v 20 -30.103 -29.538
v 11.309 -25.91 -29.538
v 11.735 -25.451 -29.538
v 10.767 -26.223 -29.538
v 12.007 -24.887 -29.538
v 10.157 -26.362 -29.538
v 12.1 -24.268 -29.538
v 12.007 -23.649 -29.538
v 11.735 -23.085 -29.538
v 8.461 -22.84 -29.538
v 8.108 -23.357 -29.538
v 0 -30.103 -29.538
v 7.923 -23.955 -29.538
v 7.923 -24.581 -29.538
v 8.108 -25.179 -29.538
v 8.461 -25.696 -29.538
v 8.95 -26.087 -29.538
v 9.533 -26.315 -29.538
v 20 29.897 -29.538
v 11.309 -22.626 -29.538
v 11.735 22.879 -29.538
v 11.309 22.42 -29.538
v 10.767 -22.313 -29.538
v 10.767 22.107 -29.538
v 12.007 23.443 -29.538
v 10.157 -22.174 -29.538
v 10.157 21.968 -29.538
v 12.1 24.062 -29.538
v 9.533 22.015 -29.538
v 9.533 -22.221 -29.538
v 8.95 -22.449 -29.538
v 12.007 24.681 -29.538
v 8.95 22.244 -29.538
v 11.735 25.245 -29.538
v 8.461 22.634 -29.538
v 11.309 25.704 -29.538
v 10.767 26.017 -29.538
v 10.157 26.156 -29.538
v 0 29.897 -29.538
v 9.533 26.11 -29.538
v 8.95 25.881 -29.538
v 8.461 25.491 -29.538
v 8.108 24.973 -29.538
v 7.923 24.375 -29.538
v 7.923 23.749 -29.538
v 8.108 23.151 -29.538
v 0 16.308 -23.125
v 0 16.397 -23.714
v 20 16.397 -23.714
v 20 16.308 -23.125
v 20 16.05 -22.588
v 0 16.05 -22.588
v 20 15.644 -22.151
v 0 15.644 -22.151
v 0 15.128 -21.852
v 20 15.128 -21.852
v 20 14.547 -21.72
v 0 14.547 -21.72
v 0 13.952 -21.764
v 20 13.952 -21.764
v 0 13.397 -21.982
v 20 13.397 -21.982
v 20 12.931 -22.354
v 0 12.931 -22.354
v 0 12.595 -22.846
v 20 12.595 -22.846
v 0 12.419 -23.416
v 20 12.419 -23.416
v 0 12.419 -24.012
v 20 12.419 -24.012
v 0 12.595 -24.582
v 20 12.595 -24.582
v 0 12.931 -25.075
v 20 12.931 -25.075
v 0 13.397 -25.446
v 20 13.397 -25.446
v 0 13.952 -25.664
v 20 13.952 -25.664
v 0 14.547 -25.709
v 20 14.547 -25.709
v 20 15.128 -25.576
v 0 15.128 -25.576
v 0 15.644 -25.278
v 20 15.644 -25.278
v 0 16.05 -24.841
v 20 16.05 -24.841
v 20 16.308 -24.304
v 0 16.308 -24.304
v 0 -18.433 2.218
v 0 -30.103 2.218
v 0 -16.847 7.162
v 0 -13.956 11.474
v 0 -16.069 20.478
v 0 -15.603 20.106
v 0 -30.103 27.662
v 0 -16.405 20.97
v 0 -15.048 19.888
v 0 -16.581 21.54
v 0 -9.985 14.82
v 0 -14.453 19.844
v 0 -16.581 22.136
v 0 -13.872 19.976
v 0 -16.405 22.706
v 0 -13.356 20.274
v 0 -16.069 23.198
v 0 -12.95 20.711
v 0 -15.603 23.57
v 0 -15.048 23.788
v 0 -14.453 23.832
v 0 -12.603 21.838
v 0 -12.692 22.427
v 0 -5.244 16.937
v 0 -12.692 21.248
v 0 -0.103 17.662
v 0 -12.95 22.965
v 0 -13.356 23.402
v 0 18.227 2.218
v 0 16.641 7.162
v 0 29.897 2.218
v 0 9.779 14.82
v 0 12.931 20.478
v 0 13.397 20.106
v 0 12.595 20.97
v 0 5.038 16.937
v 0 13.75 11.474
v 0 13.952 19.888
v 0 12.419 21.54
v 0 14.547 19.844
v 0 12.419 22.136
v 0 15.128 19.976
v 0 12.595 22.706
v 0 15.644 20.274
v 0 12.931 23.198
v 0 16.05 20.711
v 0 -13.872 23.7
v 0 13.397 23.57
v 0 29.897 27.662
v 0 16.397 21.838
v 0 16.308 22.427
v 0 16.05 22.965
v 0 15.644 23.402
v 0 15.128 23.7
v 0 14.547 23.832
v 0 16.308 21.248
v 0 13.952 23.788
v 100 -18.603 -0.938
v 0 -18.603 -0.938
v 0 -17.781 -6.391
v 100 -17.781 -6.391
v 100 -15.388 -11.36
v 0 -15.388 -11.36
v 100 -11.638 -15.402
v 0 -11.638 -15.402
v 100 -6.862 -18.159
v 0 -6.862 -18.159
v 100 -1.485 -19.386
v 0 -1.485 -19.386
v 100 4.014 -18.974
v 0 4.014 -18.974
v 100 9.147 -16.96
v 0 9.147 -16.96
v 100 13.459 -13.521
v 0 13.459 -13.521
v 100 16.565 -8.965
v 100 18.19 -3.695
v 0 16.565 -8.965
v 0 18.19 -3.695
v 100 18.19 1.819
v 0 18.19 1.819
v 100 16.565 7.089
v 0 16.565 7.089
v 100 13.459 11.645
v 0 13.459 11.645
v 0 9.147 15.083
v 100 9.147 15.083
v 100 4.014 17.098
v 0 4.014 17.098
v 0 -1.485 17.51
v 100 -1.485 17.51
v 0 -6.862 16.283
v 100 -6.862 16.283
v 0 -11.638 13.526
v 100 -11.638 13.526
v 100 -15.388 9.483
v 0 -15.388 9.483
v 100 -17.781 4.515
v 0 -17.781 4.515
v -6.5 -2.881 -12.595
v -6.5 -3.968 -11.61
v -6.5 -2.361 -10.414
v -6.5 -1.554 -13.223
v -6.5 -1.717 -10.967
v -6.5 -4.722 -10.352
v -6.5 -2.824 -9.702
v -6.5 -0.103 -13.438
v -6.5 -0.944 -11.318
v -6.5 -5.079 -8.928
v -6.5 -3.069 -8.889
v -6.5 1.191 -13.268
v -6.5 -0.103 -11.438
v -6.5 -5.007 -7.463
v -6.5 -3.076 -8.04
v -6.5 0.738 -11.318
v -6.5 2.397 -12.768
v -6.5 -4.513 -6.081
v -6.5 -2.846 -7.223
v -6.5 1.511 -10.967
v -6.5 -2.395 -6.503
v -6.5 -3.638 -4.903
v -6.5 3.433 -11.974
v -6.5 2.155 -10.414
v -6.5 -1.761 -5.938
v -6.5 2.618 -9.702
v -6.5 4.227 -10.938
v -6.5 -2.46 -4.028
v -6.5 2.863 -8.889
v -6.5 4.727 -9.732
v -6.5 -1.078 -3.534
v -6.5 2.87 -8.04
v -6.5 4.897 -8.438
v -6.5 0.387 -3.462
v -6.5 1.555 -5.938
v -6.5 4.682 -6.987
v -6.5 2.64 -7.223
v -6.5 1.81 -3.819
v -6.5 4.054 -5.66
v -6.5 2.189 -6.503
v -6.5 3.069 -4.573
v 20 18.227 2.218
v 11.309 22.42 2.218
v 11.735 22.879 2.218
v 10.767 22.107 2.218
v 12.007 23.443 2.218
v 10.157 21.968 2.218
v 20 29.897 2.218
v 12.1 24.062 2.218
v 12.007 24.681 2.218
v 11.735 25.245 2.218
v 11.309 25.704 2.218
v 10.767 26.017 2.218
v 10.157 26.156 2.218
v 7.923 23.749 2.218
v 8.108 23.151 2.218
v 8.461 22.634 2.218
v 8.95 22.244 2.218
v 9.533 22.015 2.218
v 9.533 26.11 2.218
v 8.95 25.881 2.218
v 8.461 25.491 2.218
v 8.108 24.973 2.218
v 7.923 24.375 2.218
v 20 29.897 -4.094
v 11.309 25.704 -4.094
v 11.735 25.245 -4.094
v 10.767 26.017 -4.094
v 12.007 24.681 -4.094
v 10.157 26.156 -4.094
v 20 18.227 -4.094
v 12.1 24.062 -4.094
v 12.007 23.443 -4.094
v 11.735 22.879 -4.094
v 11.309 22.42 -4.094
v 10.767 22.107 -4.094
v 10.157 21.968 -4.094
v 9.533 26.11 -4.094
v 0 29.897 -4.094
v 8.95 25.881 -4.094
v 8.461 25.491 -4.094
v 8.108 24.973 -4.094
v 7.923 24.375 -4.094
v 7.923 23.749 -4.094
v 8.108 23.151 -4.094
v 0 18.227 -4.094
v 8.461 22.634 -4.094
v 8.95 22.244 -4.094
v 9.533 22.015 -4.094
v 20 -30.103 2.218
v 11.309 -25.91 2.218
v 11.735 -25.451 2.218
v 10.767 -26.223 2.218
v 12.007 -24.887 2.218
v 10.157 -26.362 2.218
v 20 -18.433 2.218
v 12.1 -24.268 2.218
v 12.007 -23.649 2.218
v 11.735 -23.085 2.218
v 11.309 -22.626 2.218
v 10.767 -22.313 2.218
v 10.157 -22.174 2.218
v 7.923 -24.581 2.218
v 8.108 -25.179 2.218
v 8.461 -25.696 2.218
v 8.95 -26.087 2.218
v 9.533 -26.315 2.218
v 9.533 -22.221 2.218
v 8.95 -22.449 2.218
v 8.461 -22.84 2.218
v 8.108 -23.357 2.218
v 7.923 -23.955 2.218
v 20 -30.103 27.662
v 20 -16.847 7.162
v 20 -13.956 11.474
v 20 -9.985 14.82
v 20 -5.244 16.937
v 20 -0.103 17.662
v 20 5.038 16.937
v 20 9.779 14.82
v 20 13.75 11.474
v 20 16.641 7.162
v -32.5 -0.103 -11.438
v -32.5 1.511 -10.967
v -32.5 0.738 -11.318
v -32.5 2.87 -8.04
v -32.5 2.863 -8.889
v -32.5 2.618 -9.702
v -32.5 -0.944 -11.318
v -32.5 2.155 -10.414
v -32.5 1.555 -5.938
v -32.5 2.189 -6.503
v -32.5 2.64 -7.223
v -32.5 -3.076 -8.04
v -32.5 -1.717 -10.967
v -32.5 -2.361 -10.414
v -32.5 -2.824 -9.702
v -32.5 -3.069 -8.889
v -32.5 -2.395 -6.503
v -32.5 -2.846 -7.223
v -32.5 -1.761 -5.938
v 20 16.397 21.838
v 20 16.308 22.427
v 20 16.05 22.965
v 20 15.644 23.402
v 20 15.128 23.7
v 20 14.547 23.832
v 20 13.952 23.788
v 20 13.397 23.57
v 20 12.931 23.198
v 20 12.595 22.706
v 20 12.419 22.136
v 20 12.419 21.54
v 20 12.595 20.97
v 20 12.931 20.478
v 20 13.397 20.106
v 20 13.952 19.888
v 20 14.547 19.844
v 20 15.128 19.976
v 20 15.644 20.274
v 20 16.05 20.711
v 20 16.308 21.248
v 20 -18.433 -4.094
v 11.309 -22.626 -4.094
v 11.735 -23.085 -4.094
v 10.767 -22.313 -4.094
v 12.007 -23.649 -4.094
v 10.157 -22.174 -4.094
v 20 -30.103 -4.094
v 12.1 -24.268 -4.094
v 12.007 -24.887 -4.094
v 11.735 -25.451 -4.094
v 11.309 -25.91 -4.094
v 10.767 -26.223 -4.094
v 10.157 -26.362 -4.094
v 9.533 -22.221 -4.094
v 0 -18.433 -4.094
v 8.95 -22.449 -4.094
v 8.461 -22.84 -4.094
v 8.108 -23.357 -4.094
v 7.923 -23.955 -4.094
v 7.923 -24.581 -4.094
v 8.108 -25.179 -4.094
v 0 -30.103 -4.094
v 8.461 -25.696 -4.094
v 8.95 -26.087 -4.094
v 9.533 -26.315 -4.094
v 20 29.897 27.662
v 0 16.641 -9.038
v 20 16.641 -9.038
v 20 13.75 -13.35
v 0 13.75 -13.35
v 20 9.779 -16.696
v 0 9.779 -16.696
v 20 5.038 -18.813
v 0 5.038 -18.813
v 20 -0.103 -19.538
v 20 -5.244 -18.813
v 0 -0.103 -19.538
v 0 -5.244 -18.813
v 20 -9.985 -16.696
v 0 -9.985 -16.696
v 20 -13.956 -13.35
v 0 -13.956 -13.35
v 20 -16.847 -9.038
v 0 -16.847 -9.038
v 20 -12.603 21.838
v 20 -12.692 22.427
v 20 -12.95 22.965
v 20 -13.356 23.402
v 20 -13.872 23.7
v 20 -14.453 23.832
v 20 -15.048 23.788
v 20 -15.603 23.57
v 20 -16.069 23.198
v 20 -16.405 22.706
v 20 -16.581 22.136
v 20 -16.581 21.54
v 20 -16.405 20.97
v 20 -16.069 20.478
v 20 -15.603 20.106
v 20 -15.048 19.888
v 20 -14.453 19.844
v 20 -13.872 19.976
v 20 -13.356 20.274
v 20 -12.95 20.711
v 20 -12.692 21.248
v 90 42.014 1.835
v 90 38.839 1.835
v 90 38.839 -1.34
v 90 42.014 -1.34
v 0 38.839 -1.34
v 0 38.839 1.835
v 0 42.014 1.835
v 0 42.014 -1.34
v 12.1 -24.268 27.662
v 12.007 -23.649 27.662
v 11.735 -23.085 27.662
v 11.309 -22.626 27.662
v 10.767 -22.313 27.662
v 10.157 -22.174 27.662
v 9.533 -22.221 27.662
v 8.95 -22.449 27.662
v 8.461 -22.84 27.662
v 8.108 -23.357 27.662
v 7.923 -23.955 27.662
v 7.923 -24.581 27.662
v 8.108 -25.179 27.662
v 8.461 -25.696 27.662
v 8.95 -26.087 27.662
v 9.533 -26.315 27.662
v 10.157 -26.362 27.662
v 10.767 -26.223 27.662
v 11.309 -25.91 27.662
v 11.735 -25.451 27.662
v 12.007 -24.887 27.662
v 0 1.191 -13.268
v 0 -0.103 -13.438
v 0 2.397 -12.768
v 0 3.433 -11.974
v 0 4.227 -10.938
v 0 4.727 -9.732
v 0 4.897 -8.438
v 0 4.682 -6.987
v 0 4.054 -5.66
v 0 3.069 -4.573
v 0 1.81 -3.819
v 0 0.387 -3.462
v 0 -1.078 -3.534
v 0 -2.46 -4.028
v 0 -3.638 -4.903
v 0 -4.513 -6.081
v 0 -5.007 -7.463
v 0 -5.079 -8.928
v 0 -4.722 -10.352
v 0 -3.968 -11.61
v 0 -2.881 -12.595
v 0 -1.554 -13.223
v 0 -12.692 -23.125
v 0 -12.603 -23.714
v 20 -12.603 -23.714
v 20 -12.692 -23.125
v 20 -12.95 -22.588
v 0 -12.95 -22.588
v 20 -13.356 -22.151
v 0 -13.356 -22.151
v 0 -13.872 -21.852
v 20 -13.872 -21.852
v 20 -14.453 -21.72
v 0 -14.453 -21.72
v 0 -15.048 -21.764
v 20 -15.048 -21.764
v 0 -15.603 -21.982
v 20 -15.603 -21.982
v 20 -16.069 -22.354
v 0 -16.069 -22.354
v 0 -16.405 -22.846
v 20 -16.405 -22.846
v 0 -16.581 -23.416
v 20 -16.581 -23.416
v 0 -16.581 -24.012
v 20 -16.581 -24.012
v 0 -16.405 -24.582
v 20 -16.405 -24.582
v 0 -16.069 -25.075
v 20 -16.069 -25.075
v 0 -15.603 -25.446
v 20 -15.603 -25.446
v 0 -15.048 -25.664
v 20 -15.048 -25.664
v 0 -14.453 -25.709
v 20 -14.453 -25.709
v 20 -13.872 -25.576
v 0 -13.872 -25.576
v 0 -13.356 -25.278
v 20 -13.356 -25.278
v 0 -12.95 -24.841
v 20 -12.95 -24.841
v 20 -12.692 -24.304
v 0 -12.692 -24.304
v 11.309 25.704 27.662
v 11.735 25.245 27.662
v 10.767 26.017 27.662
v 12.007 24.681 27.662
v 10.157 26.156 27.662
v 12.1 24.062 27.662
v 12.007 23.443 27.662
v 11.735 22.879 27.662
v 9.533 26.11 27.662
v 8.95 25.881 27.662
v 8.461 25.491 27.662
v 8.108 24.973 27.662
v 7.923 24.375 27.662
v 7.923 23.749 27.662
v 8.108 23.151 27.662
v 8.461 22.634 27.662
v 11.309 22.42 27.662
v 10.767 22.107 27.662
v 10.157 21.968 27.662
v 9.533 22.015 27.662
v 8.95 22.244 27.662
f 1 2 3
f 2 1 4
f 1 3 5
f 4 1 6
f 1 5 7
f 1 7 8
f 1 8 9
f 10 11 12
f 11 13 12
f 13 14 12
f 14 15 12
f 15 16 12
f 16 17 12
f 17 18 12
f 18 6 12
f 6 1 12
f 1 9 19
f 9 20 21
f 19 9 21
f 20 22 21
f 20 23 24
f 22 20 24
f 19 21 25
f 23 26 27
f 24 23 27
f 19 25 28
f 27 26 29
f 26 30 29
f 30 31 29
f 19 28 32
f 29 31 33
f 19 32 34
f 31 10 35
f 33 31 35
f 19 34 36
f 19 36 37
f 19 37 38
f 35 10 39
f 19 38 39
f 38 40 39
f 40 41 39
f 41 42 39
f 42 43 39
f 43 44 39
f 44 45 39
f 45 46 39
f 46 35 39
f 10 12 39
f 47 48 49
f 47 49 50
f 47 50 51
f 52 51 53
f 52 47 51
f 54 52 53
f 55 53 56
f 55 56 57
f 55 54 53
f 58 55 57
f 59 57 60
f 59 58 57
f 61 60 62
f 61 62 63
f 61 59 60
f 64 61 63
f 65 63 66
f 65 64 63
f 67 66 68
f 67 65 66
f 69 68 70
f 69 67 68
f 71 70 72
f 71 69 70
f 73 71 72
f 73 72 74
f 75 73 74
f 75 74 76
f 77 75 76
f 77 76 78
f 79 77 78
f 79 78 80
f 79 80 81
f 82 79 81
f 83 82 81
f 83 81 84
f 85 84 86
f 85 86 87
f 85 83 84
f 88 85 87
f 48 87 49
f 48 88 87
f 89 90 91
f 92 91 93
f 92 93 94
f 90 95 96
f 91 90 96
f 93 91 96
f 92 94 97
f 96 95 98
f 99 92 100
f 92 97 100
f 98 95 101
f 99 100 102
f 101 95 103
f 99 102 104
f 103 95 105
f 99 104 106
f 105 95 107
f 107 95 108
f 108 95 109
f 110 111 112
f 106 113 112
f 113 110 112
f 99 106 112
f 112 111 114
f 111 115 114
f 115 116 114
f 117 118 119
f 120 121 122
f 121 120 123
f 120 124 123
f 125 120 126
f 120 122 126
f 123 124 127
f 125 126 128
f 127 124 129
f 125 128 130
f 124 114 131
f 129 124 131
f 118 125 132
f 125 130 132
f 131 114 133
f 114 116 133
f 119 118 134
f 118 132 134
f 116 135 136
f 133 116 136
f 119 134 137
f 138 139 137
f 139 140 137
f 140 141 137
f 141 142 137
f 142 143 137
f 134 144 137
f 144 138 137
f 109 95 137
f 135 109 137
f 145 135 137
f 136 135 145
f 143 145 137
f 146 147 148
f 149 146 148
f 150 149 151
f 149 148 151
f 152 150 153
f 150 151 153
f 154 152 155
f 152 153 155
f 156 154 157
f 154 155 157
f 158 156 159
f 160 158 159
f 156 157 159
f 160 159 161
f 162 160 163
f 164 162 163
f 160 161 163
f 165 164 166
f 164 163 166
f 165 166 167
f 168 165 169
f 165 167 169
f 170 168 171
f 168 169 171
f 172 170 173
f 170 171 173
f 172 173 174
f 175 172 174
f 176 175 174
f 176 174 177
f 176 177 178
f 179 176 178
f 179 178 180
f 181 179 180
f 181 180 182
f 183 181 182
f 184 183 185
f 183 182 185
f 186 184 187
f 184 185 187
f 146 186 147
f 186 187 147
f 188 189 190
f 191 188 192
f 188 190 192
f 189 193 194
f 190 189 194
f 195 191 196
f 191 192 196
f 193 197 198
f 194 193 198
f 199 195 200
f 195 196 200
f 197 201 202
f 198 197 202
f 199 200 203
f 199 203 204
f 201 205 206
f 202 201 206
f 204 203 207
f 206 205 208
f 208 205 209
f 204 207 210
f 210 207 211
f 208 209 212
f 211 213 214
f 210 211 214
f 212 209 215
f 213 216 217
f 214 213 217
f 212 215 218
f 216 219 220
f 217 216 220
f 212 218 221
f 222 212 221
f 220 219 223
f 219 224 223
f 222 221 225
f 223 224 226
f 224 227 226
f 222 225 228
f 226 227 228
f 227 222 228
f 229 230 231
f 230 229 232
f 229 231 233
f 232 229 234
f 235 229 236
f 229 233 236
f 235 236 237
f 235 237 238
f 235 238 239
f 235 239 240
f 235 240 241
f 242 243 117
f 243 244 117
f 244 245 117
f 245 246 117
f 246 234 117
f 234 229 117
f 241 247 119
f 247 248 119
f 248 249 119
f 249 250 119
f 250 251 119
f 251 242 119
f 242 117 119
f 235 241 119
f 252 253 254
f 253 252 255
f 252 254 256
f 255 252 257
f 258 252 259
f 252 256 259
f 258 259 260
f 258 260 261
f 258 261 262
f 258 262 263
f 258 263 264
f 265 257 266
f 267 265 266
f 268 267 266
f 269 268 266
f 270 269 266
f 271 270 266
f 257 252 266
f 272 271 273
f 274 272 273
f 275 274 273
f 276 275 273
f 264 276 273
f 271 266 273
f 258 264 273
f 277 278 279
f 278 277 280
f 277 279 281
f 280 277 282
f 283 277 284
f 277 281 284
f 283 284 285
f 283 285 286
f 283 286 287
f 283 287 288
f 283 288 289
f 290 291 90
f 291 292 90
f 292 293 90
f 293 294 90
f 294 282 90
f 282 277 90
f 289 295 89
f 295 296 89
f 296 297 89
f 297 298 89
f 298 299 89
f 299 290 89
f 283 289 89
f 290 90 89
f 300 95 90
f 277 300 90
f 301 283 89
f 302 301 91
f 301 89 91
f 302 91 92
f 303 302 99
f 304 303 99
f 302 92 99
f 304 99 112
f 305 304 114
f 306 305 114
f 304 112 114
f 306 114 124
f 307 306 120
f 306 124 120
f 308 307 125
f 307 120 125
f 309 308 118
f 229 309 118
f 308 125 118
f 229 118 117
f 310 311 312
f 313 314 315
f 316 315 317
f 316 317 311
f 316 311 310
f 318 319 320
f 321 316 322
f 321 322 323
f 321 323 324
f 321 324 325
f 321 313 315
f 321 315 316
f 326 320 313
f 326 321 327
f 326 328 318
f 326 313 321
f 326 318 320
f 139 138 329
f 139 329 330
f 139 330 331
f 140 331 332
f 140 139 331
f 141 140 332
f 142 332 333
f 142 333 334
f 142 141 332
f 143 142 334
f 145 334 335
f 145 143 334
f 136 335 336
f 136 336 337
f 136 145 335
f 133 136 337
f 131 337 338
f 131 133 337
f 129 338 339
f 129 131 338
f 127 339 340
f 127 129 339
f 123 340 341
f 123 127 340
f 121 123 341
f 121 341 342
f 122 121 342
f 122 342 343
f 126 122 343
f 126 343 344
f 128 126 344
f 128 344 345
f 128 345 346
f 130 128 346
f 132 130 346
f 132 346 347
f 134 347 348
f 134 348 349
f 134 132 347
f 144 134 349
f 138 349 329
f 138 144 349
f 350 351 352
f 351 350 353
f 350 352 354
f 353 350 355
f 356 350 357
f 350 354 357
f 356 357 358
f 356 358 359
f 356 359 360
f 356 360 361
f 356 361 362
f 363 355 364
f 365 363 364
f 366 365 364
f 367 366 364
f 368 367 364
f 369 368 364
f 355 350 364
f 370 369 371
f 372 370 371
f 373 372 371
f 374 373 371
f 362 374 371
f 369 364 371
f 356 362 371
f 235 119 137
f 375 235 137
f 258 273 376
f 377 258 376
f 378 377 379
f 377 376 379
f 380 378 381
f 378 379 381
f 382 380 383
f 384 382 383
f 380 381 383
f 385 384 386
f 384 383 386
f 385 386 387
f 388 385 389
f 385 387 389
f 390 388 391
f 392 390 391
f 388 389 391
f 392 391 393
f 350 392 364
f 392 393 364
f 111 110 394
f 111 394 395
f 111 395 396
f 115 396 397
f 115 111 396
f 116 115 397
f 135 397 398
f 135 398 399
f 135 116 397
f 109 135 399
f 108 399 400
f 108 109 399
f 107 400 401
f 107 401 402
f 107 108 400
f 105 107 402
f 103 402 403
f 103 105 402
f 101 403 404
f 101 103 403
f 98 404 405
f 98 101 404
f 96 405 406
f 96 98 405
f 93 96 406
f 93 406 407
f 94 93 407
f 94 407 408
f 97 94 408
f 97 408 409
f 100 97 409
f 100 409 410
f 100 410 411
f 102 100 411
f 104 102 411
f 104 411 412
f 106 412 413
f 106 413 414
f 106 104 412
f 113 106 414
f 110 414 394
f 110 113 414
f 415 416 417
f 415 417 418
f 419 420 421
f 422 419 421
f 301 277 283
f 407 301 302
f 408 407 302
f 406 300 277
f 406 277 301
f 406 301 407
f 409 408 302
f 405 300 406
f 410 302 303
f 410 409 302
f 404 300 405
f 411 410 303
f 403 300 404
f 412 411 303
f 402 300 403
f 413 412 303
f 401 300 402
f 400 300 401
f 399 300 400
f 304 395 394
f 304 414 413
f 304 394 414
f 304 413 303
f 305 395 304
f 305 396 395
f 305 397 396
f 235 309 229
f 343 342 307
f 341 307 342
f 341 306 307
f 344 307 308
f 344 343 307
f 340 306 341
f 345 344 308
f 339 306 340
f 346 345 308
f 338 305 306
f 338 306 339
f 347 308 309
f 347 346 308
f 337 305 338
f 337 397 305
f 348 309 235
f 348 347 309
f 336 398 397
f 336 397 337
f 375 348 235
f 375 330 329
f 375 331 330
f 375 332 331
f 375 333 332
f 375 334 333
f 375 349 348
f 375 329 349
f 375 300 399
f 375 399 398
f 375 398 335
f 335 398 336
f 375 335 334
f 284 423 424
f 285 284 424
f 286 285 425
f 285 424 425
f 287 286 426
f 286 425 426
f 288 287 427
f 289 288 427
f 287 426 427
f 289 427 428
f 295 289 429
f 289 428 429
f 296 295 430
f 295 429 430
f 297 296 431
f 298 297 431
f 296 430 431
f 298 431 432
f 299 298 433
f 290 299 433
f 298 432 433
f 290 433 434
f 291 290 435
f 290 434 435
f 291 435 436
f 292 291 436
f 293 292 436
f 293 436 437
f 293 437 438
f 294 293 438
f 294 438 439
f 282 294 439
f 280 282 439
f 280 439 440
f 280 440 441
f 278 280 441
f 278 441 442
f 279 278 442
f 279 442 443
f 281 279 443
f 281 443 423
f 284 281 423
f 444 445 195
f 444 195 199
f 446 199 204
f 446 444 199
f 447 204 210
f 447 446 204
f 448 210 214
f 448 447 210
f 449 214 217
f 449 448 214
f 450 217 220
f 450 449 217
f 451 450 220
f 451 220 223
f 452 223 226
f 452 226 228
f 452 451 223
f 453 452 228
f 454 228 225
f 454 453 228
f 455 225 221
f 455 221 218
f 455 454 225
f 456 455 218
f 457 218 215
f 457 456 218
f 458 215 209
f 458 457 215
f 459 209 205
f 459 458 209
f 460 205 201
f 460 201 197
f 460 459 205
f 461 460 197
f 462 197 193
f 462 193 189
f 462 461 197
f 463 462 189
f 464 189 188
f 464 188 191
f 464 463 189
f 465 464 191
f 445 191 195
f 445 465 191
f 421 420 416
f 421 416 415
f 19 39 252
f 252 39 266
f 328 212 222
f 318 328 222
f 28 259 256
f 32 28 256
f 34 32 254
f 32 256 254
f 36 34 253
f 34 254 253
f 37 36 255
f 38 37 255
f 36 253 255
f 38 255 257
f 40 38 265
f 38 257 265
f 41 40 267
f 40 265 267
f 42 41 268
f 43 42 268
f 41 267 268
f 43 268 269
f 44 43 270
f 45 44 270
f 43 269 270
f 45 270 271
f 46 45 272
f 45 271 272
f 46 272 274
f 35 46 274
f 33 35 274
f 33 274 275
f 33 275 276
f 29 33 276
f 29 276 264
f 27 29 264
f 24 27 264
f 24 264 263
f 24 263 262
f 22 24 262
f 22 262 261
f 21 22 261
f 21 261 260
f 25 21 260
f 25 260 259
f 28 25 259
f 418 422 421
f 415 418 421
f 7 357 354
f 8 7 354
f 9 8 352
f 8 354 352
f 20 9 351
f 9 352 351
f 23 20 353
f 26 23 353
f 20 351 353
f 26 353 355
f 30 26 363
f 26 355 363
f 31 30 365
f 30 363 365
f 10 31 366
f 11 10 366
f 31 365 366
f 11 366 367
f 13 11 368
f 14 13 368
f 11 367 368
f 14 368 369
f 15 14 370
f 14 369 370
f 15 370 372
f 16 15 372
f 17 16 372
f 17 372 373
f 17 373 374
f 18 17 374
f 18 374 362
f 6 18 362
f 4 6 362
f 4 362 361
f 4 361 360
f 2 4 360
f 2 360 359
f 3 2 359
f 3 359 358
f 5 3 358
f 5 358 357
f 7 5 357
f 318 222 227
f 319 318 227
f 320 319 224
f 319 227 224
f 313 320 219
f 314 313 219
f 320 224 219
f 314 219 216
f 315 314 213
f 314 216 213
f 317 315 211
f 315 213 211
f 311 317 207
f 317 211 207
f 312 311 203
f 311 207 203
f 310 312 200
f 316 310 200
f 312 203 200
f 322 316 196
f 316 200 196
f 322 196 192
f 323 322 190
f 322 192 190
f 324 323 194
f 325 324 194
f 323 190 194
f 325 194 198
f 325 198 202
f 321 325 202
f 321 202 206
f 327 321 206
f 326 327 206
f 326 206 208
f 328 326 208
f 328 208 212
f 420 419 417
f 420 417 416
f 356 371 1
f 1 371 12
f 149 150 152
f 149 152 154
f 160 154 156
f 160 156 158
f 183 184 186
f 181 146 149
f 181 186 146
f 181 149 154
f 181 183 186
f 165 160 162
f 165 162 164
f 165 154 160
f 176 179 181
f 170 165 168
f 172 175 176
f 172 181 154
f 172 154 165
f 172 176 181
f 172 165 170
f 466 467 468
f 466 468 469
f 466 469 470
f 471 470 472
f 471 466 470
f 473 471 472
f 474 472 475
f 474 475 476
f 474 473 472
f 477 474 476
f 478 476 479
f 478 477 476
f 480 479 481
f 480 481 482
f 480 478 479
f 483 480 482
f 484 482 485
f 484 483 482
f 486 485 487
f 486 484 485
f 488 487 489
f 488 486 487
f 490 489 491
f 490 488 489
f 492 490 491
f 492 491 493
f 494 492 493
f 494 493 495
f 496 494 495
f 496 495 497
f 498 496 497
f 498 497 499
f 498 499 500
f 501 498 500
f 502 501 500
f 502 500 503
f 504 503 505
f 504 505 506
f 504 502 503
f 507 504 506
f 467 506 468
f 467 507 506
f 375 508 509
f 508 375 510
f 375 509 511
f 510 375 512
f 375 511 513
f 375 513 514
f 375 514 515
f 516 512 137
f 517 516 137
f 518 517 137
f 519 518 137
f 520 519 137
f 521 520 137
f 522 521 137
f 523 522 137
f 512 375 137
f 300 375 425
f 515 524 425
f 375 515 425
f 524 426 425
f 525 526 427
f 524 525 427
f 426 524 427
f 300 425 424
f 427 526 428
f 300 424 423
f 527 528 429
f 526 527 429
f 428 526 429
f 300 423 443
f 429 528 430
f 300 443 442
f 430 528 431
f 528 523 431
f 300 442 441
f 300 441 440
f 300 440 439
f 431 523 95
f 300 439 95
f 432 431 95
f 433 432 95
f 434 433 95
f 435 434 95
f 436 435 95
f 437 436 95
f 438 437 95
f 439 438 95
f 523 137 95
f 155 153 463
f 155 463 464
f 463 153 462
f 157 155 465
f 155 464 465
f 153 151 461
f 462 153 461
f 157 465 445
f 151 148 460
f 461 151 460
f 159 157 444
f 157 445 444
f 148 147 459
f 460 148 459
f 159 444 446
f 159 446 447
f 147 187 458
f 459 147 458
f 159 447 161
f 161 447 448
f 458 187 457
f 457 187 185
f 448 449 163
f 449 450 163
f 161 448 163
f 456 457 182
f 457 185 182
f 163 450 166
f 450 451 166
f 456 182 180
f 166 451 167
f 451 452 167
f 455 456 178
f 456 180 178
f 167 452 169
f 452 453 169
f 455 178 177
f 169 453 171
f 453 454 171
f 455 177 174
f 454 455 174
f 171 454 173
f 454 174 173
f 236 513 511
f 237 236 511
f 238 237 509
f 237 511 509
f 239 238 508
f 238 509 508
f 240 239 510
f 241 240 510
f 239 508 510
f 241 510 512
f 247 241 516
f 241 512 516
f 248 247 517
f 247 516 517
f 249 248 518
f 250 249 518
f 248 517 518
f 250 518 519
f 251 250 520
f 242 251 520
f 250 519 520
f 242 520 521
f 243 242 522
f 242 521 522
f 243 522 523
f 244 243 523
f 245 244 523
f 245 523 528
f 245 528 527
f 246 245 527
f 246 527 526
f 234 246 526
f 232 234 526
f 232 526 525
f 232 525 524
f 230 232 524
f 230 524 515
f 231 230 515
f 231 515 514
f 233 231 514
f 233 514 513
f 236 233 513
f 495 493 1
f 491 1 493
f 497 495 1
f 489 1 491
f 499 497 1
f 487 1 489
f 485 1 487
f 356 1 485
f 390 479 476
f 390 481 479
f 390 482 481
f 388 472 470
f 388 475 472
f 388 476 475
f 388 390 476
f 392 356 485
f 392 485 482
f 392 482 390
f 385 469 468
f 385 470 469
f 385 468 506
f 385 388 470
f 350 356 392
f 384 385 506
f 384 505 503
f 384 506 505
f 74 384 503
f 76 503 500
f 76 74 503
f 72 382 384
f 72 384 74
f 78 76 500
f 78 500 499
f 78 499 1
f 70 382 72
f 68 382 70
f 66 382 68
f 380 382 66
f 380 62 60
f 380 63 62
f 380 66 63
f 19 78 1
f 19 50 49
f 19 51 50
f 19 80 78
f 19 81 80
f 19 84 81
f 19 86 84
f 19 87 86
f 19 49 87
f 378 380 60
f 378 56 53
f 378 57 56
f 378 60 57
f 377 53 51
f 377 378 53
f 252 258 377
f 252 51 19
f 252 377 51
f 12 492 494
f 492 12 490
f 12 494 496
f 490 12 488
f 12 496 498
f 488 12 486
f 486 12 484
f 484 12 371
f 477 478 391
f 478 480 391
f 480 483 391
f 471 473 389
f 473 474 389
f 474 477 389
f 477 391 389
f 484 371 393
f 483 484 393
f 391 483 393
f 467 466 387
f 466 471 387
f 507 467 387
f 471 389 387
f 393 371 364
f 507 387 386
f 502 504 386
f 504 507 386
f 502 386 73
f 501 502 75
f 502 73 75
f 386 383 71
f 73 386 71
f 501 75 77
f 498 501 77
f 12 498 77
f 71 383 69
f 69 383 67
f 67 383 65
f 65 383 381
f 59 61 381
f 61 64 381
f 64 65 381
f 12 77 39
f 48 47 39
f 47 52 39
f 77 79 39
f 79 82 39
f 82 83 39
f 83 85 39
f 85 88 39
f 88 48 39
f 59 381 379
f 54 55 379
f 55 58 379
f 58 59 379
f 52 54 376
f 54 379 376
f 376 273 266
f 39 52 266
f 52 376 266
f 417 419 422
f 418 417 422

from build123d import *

# Parameters (mm, degrees)
F1_DEPTH  = 20
F2_R      = 2.1
F3_DEPTH  = 57.2
F4_W      = 3.175
F4_H      = 3.175
F5_DEPTH  = 90
F6_DEPTH  = 100
F7_DEPTH  = 6.5
F8_R      = 2
F9_DEPTH  = 20
F11_DEPTH = 26


with BuildPart() as f1:
    # F0 (on Right) → F1 (new body)
    with BuildSketch(Plane.YZ):
        with BuildLine():
            Line((29.8970502992, 27.6619047619), (-30.1029497008, 27.6619047619))
            Line((-30.1029497008, 27.6619047619), (-30.1029497008, 2.2178515295))
            Line((-30.1029497008, 2.2178515295), (-18.4332524806, 2.2178515295))
            ThreePointArc((-18.4332524806, 2.2178515295), (-0.1029497008, 17.6619047619), (18.227353079, 2.2178515295))
            Line((18.227353079, 2.2178515295), (29.8970502992, 2.2178515295))
            Line((29.8970502992, 2.2178515295), (29.8970502992, 27.6619047619))
        make_face()
    extrude(amount=F1_DEPTH)


with BuildPart() as f1b:
    # F0 (on Right) → F1, piece 2 (new body)
    with BuildSketch(Plane.YZ):
        with BuildLine():
            Line((-30.1029497008, -29.5380952381), (29.8970502992, -29.5380952381))
            Line((29.8970502992, -29.5380952381), (29.8970502992, -4.0940420057))
            Line((29.8970502992, -4.0940420057), (18.227353079, -4.0940420057))
            ThreePointArc((18.227353079, -4.0940420057), (-0.1029497008, -19.5380952381), (-18.4332524806, -4.0940420057))
            Line((-18.4332524806, -4.0940420057), (-30.1029497008, -4.0940420057))
            Line((-30.1029497008, -4.0940420057), (-30.1029497008, -29.5380952381))
        make_face()
    extrude(amount=F1_DEPTH)


with BuildPart() as f3_tool:
    # F2 (on face) → F3 (new body, through all)
    with BuildSketch(Plane.XY.offset(27.6619047619)):
        with Locations((10, -24.2681010907)):
            Circle(F2_R)
        with Locations((10, 24.0622016891)):
            Circle(F2_R)
    extrude(amount=-F3_DEPTH)


with BuildPart() as f1_1:
    add(f1.part)

    # F3: cut by f3_tool
    add(f3_tool.part, mode=Mode.SUBTRACT)


with BuildPart() as f1b_1:
    add(f1b.part)

    # F3: cut by f3_tool
    add(f3_tool.part, mode=Mode.SUBTRACT)


with BuildPart() as f5:
    # F4 (on Right) → F5 (new body)
    with BuildSketch(Plane.YZ):
        with Locations((40.4263884993, 0.2473239583)):
            Rectangle(F4_W, F4_H)
    extrude(amount=F5_DEPTH)


with BuildPart() as f6:
    # F0 (on Right) → F6 (new body)
    with BuildSketch(Plane.YZ):
        with BuildLine():
            Line((12.3970502992, -0.9380952381), (18.3970502992, -0.9380952381))
            ThreePointArc((18.3970502992, -0.9380952381), (-0.1029497008, 17.5619047619), (-18.6029497008, -0.9380952381))
            Line((-18.6029497008, -0.9380952381), (-12.6029497008, -0.9380952381))
            ThreePointArc((-12.6029497008, -0.9380952381), (-0.1029497008, 11.5619047619), (12.3970502992, -0.9380952381))
        make_face()
        with BuildLine():
            ThreePointArc((-0.1029497008, -13.4380952381), (8.735885064, -9.7769300029), (12.3970502992, -0.9380952381))
            Line((12.3970502992, -0.9380952381), (-12.6029497008, -0.9380952381))
            ThreePointArc((-12.6029497008, -0.9380952381), (-8.9417844656, -9.7769300029), (-0.1029497008, -13.4380952381))
        make_face()
        with BuildLine():
            ThreePointArc((4.8970502992, -8.4380952381), (3.4325842051, -11.973629144), (-0.1029497008, -13.4380952381))
            ThreePointArc((-0.1029497008, -13.4380952381), (-3.6384836067, -4.9025613322), (4.8970502992, -8.4380952381))
        make_face(mode=Mode.SUBTRACT)
        with BuildLine():
            ThreePointArc((-18.6029497008, -0.9380952381), (-0.1029497008, -19.4380952381), (18.3970502992, -0.9380952381))
            Line((18.3970502992, -0.9380952381), (12.3970502992, -0.9380952381))
            ThreePointArc((12.3970502992, -0.9380952381), (8.735885064, -9.7769300029), (-0.1029497008, -13.4380952381))
            ThreePointArc((-0.1029497008, -13.4380952381), (-8.9417844656, -9.7769300029), (-12.6029497008, -0.9380952381))
            Line((-12.6029497008, -0.9380952381), (-18.6029497008, -0.9380952381))
        make_face()
        with BuildLine():
            Line((-12.6029497008, -0.9380952381), (12.3970502992, -0.9380952381))
            ThreePointArc((12.3970502992, -0.9380952381), (-0.1029497008, 11.5619047619), (-12.6029497008, -0.9380952381))
        make_face()
        with BuildLine():
            ThreePointArc((4.8970502992, -8.4380952381), (-3.6384836067, -4.9025613322), (-0.1029497008, -13.4380952381))
            ThreePointArc((-0.1029497008, -13.4380952381), (3.4325842051, -11.973629144), (4.8970502992, -8.4380952381))
        make_face()
    extrude(amount=F6_DEPTH)

    # F0 (on Right) → F7 (join)
    with BuildSketch(Plane.YZ):
        with BuildLine():
            ThreePointArc((4.8970502992, -8.4380952381), (-3.6384836067, -4.9025613322), (-0.1029497008, -13.4380952381))
            ThreePointArc((-0.1029497008, -13.4380952381), (3.4325842051, -11.973629144), (4.8970502992, -8.4380952381))
        make_face()
    extrude(amount=-F7_DEPTH)

    # F10 (on face) → F11 (join)
    with BuildSketch(Plane(origin=(-6.5, 0, 0), x_dir=(0, -1, 0), z_dir=(-1, 0, 0))):
        with BuildLine():
            Line((0.1029497008, -5.9380952381), (-1.5553626944, -5.9380952381))
            ThreePointArc((-1.5553626944, -5.9380952381), (0.1029497008, -11.4380952381), (1.761262096, -5.9380952381))
            Line((1.761262096, -5.9380952381), (0.1029497008, -5.9380952381))
        make_face()
    extrude(amount=F11_DEPTH)


with BuildPart() as f9_tool:
    # F8 (on Right) → F9 (new body, through all)
    with BuildSketch(Plane.YZ):
        with Locations((14.3970502992, -23.714179186)):
            Circle(F8_R)
        with Locations((-14.6029497008, -23.714179186)):
            Circle(F8_R)
        with Locations((14.3970502992, 21.8379887098)):
            Circle(F8_R)
        with Locations((-14.6029497008, 21.8379887098)):
            Circle(F8_R)
    extrude(amount=F9_DEPTH)


with BuildPart() as f1_2:
    add(f1_1.part)

    # F9: cut by f9_tool
    add(f9_tool.part, mode=Mode.SUBTRACT)


with BuildPart() as f1b_2:
    add(f1b_1.part)

    # F9: cut by f9_tool
    add(f9_tool.part, mode=Mode.SUBTRACT)


solid = Compound([f5.part, f6.part, f1_2.part, f1b_2.part])
